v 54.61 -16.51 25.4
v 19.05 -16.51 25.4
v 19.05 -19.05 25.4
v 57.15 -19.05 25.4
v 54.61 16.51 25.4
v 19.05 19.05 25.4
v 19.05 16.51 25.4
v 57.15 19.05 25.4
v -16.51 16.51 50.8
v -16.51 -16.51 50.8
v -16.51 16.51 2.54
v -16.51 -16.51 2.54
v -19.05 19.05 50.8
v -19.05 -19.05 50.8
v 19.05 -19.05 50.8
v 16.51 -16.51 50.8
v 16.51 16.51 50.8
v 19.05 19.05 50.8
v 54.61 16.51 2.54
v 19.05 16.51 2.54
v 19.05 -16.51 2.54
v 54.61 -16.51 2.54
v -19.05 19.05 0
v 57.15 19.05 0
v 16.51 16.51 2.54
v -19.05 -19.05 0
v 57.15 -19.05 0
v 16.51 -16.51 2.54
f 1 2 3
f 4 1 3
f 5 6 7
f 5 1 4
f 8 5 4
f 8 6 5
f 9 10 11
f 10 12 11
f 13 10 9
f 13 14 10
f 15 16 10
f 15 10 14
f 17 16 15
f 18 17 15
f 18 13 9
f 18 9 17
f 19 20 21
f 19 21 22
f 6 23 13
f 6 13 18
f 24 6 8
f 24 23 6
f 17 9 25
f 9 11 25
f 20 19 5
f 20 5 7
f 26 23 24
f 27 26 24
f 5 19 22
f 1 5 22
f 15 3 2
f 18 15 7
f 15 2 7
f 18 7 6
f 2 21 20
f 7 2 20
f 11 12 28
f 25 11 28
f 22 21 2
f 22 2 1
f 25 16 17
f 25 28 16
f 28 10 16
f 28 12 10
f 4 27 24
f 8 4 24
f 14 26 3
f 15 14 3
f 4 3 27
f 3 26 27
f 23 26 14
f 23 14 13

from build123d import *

# Parameters (mm, degrees)
F0_W     = 38.1
F0_H     = 38.1
F1_DEPTH = 50.8
F2_T     = -2.54
F3_DEPTH = 25.4
F4_T     = -2.54


# Not quite as in the source:
# - a shell that OpenCascade refuses in one call is made with other operations: the cavity is built on its own and cut out


with BuildPart() as f1:
    # F0 (on Top) → F1 (new body)
    with BuildSketch(Plane.XY):
        Rectangle(F0_W, F0_H)
    extrude(amount=F1_DEPTH)

    # F2
    f2_openings = [f1.faces().sort_by_distance(p)[0] for p in [
        (0, 0, 50.8),
    ]]
    offset(amount=F2_T, openings=f2_openings)

    # F0 (on Top) → F3 (join)
    with BuildSketch(Plane.XY):
        with Locations((38.1, 0)):
            Rectangle(F0_W, F0_H)
    extrude(amount=F3_DEPTH)

    # F4: a shell. OpenCascade refuses it in one call, so the cavity is built on its own and cut out:
    # the body offset inwards by the wall thickness, plus a prism from it out through each open face.
    f4_core = offset(f1.part, amount=F4_T, kind=Kind.INTERSECTION, mode=Mode.PRIVATE)
    f4_exits = [f4_core.faces().sort_by_distance(p)[0] for p in [
        (36.83, 0, 22.86),
    ]]
    add(f4_core, mode=Mode.SUBTRACT)
    extrude(f4_exits, amount=-F4_T, mode=Mode.SUBTRACT)


solid = f1.part
